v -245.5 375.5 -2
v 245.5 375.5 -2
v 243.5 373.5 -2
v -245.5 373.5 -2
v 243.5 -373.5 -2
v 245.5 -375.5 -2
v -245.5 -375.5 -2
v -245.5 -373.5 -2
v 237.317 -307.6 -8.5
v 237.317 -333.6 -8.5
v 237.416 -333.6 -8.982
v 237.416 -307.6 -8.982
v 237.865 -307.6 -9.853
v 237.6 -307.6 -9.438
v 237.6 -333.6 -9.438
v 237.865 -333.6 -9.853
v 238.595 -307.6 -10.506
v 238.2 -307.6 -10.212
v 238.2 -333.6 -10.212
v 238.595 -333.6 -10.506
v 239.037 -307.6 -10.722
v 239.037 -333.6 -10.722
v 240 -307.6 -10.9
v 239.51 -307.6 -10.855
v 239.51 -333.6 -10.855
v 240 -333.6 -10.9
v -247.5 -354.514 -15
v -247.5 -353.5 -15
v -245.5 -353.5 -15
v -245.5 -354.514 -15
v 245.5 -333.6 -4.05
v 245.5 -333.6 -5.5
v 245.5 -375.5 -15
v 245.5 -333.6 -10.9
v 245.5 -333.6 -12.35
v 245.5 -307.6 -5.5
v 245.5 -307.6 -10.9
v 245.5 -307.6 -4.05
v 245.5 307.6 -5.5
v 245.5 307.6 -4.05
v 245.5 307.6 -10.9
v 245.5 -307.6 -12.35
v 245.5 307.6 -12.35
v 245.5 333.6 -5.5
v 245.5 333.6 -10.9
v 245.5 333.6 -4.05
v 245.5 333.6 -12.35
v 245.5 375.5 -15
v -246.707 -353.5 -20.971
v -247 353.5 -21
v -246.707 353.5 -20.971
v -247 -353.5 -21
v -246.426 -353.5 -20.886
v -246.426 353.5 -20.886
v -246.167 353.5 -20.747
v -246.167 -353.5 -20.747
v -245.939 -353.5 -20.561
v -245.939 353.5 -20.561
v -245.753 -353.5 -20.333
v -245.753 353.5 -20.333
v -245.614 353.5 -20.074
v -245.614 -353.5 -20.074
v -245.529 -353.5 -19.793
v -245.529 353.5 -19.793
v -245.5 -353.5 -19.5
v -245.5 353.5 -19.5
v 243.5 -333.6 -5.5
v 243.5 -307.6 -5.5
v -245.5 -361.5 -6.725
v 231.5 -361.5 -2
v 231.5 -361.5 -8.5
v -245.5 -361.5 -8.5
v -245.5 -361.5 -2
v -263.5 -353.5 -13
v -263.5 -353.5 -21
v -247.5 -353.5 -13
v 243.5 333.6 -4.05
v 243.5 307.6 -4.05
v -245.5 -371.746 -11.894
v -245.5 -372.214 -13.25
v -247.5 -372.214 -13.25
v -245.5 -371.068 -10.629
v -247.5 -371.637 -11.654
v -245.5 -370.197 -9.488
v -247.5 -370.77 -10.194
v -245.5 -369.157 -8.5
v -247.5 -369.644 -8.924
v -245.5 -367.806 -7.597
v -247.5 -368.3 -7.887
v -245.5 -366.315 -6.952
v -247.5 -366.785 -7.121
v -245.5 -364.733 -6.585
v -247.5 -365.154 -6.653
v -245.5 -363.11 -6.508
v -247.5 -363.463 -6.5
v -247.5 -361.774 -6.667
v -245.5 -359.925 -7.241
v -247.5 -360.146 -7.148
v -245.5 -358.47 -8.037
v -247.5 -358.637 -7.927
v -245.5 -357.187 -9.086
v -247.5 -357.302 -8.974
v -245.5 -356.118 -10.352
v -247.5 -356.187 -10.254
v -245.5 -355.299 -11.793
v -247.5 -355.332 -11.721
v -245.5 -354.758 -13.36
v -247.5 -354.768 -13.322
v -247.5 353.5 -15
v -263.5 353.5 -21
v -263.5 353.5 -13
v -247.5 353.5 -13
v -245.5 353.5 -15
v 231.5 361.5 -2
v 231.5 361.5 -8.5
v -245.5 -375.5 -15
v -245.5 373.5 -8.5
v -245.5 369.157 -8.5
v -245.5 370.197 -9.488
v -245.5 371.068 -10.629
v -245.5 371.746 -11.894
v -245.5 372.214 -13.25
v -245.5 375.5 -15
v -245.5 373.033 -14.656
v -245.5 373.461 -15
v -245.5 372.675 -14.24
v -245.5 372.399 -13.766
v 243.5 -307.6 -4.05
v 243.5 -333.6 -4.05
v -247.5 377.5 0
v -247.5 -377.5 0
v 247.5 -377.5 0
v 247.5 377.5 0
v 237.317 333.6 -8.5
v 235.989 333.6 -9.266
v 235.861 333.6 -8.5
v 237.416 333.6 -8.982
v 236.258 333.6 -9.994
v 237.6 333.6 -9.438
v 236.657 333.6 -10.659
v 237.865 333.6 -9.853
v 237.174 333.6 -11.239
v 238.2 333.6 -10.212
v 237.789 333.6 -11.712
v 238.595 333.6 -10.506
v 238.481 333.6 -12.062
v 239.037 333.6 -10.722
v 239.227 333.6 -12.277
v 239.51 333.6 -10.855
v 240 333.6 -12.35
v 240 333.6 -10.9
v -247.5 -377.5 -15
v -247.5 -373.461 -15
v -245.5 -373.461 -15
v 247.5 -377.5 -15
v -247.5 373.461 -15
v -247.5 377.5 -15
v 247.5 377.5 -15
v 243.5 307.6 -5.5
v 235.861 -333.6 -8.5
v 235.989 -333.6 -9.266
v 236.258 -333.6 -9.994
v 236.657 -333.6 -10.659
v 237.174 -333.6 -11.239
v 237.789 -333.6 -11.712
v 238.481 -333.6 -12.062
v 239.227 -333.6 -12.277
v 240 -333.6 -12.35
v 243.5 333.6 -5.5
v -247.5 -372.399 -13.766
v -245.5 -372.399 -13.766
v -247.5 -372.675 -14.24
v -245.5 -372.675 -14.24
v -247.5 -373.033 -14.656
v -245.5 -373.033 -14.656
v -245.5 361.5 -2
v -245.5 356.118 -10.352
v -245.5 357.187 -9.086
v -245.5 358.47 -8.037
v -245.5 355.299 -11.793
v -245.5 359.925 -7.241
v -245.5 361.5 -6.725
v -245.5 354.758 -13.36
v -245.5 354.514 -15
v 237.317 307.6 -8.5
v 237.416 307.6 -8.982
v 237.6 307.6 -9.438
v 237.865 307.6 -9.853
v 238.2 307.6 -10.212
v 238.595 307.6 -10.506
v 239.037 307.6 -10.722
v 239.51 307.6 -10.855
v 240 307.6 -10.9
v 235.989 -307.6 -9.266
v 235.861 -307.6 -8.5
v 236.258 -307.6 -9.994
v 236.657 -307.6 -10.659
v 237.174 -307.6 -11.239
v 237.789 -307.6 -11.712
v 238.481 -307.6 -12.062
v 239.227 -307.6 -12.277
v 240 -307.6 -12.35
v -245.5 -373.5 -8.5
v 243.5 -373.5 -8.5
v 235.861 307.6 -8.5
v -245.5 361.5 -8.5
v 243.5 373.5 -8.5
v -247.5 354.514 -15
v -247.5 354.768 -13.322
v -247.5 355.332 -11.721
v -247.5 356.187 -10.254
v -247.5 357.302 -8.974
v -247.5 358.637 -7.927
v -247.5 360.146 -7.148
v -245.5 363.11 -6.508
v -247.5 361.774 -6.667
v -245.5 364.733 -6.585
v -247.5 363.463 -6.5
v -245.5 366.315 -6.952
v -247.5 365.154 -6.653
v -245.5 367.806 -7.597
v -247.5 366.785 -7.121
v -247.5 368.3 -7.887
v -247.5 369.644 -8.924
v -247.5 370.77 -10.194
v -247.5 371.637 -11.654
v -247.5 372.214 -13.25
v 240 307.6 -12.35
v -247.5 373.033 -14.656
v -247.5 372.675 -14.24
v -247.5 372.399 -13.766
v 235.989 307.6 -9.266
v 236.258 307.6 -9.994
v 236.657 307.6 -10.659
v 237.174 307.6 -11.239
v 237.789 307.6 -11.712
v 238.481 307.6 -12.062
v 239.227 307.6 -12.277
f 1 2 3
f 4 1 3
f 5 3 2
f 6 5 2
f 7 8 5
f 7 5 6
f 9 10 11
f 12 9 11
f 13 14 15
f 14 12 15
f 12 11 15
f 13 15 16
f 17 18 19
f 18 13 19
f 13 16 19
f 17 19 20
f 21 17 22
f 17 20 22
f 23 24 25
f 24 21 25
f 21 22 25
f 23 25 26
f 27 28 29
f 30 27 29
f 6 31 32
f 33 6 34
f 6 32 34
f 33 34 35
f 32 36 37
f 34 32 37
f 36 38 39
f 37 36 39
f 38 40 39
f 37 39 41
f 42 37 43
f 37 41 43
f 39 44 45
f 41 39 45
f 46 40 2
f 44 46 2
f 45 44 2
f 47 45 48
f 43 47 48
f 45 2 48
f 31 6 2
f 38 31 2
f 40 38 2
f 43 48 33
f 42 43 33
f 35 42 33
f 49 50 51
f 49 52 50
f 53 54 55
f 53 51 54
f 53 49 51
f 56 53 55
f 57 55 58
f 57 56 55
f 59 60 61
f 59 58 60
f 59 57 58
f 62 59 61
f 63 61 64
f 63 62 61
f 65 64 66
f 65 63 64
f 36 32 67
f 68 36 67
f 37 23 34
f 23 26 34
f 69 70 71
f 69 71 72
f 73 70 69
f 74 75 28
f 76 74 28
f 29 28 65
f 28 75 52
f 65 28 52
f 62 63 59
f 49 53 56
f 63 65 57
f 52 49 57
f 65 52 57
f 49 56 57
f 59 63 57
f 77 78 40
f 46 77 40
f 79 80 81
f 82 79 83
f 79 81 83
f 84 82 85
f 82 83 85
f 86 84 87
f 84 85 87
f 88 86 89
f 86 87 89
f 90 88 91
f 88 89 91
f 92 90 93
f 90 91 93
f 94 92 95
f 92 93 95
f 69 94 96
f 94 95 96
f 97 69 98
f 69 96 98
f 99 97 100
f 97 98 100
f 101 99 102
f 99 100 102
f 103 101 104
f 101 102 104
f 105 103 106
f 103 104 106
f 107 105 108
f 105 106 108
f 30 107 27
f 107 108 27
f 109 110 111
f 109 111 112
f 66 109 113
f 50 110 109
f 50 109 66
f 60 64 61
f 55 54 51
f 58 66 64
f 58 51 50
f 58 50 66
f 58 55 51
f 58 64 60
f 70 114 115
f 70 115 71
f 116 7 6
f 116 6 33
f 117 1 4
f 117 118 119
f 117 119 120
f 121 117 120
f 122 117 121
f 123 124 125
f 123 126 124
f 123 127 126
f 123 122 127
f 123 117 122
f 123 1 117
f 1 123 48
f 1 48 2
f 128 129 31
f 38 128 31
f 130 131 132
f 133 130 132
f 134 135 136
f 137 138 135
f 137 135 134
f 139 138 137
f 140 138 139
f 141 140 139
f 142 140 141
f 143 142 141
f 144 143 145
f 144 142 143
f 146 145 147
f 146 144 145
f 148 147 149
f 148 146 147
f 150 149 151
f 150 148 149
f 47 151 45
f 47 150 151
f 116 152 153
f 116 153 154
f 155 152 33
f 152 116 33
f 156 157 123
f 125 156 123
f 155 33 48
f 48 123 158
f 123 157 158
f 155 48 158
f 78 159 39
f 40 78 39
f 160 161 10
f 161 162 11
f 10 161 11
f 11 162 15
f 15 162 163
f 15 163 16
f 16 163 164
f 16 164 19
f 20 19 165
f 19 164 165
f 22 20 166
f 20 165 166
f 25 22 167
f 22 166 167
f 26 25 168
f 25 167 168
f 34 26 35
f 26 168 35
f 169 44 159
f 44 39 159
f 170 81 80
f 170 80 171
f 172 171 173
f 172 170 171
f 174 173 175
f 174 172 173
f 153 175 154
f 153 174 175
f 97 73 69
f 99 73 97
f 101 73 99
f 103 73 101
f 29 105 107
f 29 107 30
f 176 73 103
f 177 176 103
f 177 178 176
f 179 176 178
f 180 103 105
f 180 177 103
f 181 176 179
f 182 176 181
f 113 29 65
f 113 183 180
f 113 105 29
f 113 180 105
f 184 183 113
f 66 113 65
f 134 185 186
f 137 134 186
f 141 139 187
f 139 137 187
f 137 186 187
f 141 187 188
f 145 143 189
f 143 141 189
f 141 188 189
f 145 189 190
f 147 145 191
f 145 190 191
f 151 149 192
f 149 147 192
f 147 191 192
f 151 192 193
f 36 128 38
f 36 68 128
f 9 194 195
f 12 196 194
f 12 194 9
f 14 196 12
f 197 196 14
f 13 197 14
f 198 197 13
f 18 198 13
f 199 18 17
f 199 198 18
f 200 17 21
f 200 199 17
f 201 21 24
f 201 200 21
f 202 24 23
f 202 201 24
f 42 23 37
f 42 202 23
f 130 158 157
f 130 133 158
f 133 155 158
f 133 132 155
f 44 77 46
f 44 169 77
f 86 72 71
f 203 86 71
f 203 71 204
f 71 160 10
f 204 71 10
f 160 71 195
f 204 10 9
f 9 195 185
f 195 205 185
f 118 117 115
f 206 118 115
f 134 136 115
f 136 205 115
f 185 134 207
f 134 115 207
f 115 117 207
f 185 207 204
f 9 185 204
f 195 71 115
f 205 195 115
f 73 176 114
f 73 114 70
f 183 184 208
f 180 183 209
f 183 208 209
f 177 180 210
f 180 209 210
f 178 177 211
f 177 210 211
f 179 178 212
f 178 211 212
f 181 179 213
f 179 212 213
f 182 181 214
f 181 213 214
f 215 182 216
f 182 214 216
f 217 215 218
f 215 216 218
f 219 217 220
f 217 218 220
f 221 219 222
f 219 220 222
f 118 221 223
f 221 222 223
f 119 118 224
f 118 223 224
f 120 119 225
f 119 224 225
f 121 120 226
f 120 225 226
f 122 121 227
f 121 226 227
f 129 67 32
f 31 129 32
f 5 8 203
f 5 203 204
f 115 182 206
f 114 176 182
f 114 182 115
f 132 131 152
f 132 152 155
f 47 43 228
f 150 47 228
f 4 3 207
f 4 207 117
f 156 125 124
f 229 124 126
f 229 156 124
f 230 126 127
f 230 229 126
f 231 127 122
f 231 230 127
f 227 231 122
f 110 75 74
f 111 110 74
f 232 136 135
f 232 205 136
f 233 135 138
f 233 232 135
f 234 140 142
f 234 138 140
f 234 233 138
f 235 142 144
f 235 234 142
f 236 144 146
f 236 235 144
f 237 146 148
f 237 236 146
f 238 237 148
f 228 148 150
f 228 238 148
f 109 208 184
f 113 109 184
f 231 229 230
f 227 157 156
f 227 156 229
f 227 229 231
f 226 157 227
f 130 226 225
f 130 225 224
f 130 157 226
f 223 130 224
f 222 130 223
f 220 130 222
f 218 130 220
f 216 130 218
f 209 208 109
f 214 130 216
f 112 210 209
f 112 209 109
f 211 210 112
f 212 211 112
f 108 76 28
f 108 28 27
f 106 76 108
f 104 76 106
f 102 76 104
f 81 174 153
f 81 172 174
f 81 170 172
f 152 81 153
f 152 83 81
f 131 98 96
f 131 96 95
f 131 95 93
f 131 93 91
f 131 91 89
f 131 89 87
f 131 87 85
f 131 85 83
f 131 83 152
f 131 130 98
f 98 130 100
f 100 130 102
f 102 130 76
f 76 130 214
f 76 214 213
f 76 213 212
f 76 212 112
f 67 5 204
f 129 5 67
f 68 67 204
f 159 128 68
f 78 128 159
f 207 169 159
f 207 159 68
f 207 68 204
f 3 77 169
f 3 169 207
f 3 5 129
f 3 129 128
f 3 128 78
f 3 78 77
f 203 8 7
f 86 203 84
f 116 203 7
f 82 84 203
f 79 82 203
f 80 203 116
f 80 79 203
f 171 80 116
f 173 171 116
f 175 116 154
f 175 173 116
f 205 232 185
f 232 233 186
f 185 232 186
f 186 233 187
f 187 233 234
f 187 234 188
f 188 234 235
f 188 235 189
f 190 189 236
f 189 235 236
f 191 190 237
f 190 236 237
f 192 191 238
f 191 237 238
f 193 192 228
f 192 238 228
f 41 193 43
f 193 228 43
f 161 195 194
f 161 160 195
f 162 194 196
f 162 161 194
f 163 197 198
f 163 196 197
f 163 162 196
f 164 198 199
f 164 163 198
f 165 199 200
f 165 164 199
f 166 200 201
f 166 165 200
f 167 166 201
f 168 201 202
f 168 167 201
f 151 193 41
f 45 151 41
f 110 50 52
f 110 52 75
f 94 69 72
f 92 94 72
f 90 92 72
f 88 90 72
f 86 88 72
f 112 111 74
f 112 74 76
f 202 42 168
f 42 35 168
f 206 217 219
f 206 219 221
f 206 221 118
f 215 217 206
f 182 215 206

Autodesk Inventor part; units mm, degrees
sketch "Skizze_1" plane through (0, 0, 0) normal (0, 0, 1) x (1, 0, 0)
  line L0 (-247.5, 377.5) -> (-247.5, -377.5)
  line L1 (-247.5, -377.5) -> (247.5, -377.5)
  line L2 (247.5, -377.5) -> (247.5, 377.5)
  line L3 (247.5, 377.5) -> (-247.5, 377.5)
extrude "Extrusion1" add sketch "Skizze_1" against normal blind 15
sketch "Skizze_2" plane through (0, 0, 0) normal (1, 0, 0) x (0, 0, -1)
  line L0 (2, 375.5) -> (2, -375.5)
  line L1 (2, -375.5) -> (17, -375.5)
  line L2 (17, -375.5) -> (17, 375.5)
  line L3 (17, 375.5) -> (2, 375.5)
extrude "Extrusion2" cut sketch "Skizze_2" along normal mid plane 491
sketch "Skizze_3" plane through (0, 0, -2) normal (0, 0, 1) x (1, 0, 0)
  line L0 (-245.5, 361.5) -> (231.5, 361.5)
  line L1 (231.5, 361.5) -> (231.5, -361.5)
  line L2 (231.5, -361.5) -> (-245.5, -361.5)
  line L3 (-245.5, -361.5) -> (-245.5, -373.5)
  line L4 (-245.5, -373.5) -> (243.5, -373.5)
  line L5 (243.5, -373.5) -> (243.5, 373.5)
  line L6 (243.5, 373.5) -> (-245.5, 373.5)
  line L7 (-245.5, 373.5) -> (-245.5, 361.5)
sketch "Skizze_21" plane through (0, -320.6, 0) normal (0, 1, 0) x (1, 0, 0)
  arc A0 (240, 12.35) -> (240, 4.05) centre (240, 8.2) ccw
  line L0 (240, 4.05) -> (245.5, 4.05)
  line L1 (245.5, 4.05) -> (245.5, 5.5)
  line L2 (245.5, 5.5) -> (240, 5.5)
  arc A1 (240, 10.9) -> (240, 5.5) centre (240, 8.2) ccw
  line L3 (240, 10.9) -> (245.5, 10.9)
  line L4 (245.5, 10.9) -> (245.5, 12.35)
  line L5 (245.5, 12.35) -> (240, 12.35)
extrude "Extrusion3" add sketch "Skizze_21" along normal mid plane 26
sketch "Skizze_22" plane through (0, 320.6, 0) normal (0, 1, 0) x (1, 0, 0)
  arc A0 (240, 12.35) -> (240, 4.05) centre (240, 8.2) ccw
  line L0 (240, 4.05) -> (245.5, 4.05)
  line L1 (245.5, 4.05) -> (245.5, 5.5)
  line L2 (245.5, 5.5) -> (240, 5.5)
  arc A1 (240, 10.9) -> (240, 5.5) centre (240, 8.2) ccw
  line L3 (240, 10.9) -> (245.5, 10.9)
  line L4 (245.5, 10.9) -> (245.5, 12.35)
  line L5 (245.5, 12.35) -> (240, 12.35)
extrude "Extrusion4" add sketch "Skizze_22" along normal mid plane 26
sketch "Skizze_23" plane through (0, 0, 0) normal (0, 1, 0) x (1, 0, 0)
  line L0 (-263.5, 19) -> (-248, 19)
  arc A0 (-247.5, 18.5) -> (-248, 19) centre (-248, 18.5) ccw
  line L1 (-247.5, 18.5) -> (-247.5, 15)
  line L2 (-247.5, 15) -> (-245.5, 15)
  line L3 (-245.5, 15) -> (-245.5, 19.5)
  arc A1 (-245.5, 19.5) -> (-247, 21) centre (-247, 19.5) ccw
  line L4 (-247, 21) -> (-263.5, 21)
  line L5 (-263.5, 21) -> (-263.5, 19)
extrude "Extrusion5" add sketch "Skizze_23" along normal mid plane 707
sketch "Skizze_24" plane through (-247.5, 0, 0) normal (1, 0, 0) x (0, 0, -1)
  arc A0 (13.25, 372.2142) -> (15.5, 354.5) centre (15.5, 363.5) ccw
  line L0 (15.5, 354.5) -> (15.5, 375.119)
  arc A1 (13.25, 372.2142) -> (15.5, 375.119) centre (12.5, 375.119) ccw
extrude "Extrusion6" cut sketch "Skizze_24" along normal blind 3
sketch "Skizze_26" plane through (-247.5, 0, 0) normal (1, 0, 0) x (0, 0, -1)
  arc A0 (15.5, -354.5) -> (13.25, -372.2142) centre (15.5, -363.5) ccw
  arc A1 (15.5, -375.119) -> (13.25, -372.2142) centre (12.5, -375.119) ccw
  line L0 (15.5, -375.119) -> (15.5, -354.5)
extrude "Extrusion7" cut sketch "Skizze_26" along normal blind 3
sketch "Skizze_27" plane through (0, 0, 0) normal (0, 1, 0) x (1, 0, 0)
  line L0 (-263.5, 19) -> (-263.5, 13)
  line L1 (-263.5, 13) -> (-247.5, 13)
  line L2 (-247.5, 13) -> (-247.5, 19)
  line L3 (-247.5, 19) -> (-263.5, 19)
extrude "Extrusion8" add sketch "Skizze_27" along normal mid plane 707
extrude "Extrusion9" add sketch "Skizze_3" against normal blind 6.5
ref_plane "DPB21_XY" through (247.5, 377.5, 0) normal (0, 0, 1) x (1, 0, 0)
ref_plane "DPB21_YZ" through (247.5, 377.5, 0) normal (1, 0, 0) x (0, 1, 0)
ref_plane "DPB21_ZX" through (247.5, 377.5, 0) normal (0, 1, 0) x (0, 0, 1)
ref_plane "DPB211_XY" through (250, 377.5, 0) normal (0, 0, 1) x (1, 0, 0)
ref_plane "DPB211_YZ" through (250, 377.5, 0) normal (1, 0, 0) x (0, 1, 0)
ref_plane "DPB211_ZX" through (250, 377.5, 0) normal (0, 1, 0) x (0, 0, 1)
ref_plane "DPB22_XY" through (-247.5, 377.5, 0) normal (0, 0, 1) x (1, 0, 0)
ref_plane "DPB22_YZ" through (-247.5, 377.5, 0) normal (1, 0, 0) x (0, 1, 0)
ref_plane "DPB22_ZX" through (-247.5, 377.5, 0) normal (0, 1, 0) x (0, 0, 1)
ref_plane "DPB41_XY" through (205.5, 349, 0) normal (0, 0, 1) x (1, 0, 0)
ref_plane "DPB41_YZ" through (205.5, 349, 0) normal (1, 0, 0) x (0, 1, 0)
ref_plane "DPB41_ZX" through (205.5, 349, 0) normal (0, 1, 0) x (0, 0, 1)
ref_plane "DPB42_XY" through (-218.5, 299, 0) normal (0, 0, 1) x (1, 0, 0)
ref_plane "DPB42_YZ" through (-218.5, 299, 0) normal (1, 0, 0) x (0, 1, 0)
ref_plane "DPB42_ZX" through (-218.5, 299, 0) normal (0, 1, 0) x (0, 0, 1)
ref_plane "DPB51_XY" through (-224.5, 287.5, 0) normal (0, 0, 1) x (1, 0, 0)
ref_plane "DPB51_YZ" through (-224.5, 287.5, 0) normal (1, 0, 0) x (0, 1, 0)
ref_plane "DPB51_ZX" through (-224.5, 287.5, 0) normal (0, 1, 0) x (0, 0, 1)
ref_plane "DPB52_XY" through (211.5, 337.5, 0) normal (0, 0, 1) x (1, 0, 0)
ref_plane "DPB52_YZ" through (211.5, 337.5, 0) normal (1, 0, 0) x (0, 1, 0)
ref_plane "DPB52_ZX" through (211.5, 337.5, 0) normal (0, 1, 0) x (0, 0, 1)
ref_plane "tuer_XY" through (240, -320.6, -8.2) normal (0, 1, 0) x (1, 0, 0)
ref_plane "tuer_YZ" through (240, -320.6, -8.2) normal (1, 0, 0) x (0, 0, -1)
ref_plane "tuer_ZX" through (240, -320.6, -8.2) normal (0, 0, -1) x (0, 1, 0)
ref_plane "tuer_l_XY" through (240, 320.6, -8.2) normal (0, 1, 0) x (1, 0, 0)
ref_plane "tuer_l_YZ" through (240, 320.6, -8.2) normal (1, 0, 0) x (0, 0, -1)
ref_plane "tuer_l_ZX" through (240, 320.6, -8.2) normal (0, 0, -1) x (0, 1, 0)
properties part number "1130_01_02 (2)"
